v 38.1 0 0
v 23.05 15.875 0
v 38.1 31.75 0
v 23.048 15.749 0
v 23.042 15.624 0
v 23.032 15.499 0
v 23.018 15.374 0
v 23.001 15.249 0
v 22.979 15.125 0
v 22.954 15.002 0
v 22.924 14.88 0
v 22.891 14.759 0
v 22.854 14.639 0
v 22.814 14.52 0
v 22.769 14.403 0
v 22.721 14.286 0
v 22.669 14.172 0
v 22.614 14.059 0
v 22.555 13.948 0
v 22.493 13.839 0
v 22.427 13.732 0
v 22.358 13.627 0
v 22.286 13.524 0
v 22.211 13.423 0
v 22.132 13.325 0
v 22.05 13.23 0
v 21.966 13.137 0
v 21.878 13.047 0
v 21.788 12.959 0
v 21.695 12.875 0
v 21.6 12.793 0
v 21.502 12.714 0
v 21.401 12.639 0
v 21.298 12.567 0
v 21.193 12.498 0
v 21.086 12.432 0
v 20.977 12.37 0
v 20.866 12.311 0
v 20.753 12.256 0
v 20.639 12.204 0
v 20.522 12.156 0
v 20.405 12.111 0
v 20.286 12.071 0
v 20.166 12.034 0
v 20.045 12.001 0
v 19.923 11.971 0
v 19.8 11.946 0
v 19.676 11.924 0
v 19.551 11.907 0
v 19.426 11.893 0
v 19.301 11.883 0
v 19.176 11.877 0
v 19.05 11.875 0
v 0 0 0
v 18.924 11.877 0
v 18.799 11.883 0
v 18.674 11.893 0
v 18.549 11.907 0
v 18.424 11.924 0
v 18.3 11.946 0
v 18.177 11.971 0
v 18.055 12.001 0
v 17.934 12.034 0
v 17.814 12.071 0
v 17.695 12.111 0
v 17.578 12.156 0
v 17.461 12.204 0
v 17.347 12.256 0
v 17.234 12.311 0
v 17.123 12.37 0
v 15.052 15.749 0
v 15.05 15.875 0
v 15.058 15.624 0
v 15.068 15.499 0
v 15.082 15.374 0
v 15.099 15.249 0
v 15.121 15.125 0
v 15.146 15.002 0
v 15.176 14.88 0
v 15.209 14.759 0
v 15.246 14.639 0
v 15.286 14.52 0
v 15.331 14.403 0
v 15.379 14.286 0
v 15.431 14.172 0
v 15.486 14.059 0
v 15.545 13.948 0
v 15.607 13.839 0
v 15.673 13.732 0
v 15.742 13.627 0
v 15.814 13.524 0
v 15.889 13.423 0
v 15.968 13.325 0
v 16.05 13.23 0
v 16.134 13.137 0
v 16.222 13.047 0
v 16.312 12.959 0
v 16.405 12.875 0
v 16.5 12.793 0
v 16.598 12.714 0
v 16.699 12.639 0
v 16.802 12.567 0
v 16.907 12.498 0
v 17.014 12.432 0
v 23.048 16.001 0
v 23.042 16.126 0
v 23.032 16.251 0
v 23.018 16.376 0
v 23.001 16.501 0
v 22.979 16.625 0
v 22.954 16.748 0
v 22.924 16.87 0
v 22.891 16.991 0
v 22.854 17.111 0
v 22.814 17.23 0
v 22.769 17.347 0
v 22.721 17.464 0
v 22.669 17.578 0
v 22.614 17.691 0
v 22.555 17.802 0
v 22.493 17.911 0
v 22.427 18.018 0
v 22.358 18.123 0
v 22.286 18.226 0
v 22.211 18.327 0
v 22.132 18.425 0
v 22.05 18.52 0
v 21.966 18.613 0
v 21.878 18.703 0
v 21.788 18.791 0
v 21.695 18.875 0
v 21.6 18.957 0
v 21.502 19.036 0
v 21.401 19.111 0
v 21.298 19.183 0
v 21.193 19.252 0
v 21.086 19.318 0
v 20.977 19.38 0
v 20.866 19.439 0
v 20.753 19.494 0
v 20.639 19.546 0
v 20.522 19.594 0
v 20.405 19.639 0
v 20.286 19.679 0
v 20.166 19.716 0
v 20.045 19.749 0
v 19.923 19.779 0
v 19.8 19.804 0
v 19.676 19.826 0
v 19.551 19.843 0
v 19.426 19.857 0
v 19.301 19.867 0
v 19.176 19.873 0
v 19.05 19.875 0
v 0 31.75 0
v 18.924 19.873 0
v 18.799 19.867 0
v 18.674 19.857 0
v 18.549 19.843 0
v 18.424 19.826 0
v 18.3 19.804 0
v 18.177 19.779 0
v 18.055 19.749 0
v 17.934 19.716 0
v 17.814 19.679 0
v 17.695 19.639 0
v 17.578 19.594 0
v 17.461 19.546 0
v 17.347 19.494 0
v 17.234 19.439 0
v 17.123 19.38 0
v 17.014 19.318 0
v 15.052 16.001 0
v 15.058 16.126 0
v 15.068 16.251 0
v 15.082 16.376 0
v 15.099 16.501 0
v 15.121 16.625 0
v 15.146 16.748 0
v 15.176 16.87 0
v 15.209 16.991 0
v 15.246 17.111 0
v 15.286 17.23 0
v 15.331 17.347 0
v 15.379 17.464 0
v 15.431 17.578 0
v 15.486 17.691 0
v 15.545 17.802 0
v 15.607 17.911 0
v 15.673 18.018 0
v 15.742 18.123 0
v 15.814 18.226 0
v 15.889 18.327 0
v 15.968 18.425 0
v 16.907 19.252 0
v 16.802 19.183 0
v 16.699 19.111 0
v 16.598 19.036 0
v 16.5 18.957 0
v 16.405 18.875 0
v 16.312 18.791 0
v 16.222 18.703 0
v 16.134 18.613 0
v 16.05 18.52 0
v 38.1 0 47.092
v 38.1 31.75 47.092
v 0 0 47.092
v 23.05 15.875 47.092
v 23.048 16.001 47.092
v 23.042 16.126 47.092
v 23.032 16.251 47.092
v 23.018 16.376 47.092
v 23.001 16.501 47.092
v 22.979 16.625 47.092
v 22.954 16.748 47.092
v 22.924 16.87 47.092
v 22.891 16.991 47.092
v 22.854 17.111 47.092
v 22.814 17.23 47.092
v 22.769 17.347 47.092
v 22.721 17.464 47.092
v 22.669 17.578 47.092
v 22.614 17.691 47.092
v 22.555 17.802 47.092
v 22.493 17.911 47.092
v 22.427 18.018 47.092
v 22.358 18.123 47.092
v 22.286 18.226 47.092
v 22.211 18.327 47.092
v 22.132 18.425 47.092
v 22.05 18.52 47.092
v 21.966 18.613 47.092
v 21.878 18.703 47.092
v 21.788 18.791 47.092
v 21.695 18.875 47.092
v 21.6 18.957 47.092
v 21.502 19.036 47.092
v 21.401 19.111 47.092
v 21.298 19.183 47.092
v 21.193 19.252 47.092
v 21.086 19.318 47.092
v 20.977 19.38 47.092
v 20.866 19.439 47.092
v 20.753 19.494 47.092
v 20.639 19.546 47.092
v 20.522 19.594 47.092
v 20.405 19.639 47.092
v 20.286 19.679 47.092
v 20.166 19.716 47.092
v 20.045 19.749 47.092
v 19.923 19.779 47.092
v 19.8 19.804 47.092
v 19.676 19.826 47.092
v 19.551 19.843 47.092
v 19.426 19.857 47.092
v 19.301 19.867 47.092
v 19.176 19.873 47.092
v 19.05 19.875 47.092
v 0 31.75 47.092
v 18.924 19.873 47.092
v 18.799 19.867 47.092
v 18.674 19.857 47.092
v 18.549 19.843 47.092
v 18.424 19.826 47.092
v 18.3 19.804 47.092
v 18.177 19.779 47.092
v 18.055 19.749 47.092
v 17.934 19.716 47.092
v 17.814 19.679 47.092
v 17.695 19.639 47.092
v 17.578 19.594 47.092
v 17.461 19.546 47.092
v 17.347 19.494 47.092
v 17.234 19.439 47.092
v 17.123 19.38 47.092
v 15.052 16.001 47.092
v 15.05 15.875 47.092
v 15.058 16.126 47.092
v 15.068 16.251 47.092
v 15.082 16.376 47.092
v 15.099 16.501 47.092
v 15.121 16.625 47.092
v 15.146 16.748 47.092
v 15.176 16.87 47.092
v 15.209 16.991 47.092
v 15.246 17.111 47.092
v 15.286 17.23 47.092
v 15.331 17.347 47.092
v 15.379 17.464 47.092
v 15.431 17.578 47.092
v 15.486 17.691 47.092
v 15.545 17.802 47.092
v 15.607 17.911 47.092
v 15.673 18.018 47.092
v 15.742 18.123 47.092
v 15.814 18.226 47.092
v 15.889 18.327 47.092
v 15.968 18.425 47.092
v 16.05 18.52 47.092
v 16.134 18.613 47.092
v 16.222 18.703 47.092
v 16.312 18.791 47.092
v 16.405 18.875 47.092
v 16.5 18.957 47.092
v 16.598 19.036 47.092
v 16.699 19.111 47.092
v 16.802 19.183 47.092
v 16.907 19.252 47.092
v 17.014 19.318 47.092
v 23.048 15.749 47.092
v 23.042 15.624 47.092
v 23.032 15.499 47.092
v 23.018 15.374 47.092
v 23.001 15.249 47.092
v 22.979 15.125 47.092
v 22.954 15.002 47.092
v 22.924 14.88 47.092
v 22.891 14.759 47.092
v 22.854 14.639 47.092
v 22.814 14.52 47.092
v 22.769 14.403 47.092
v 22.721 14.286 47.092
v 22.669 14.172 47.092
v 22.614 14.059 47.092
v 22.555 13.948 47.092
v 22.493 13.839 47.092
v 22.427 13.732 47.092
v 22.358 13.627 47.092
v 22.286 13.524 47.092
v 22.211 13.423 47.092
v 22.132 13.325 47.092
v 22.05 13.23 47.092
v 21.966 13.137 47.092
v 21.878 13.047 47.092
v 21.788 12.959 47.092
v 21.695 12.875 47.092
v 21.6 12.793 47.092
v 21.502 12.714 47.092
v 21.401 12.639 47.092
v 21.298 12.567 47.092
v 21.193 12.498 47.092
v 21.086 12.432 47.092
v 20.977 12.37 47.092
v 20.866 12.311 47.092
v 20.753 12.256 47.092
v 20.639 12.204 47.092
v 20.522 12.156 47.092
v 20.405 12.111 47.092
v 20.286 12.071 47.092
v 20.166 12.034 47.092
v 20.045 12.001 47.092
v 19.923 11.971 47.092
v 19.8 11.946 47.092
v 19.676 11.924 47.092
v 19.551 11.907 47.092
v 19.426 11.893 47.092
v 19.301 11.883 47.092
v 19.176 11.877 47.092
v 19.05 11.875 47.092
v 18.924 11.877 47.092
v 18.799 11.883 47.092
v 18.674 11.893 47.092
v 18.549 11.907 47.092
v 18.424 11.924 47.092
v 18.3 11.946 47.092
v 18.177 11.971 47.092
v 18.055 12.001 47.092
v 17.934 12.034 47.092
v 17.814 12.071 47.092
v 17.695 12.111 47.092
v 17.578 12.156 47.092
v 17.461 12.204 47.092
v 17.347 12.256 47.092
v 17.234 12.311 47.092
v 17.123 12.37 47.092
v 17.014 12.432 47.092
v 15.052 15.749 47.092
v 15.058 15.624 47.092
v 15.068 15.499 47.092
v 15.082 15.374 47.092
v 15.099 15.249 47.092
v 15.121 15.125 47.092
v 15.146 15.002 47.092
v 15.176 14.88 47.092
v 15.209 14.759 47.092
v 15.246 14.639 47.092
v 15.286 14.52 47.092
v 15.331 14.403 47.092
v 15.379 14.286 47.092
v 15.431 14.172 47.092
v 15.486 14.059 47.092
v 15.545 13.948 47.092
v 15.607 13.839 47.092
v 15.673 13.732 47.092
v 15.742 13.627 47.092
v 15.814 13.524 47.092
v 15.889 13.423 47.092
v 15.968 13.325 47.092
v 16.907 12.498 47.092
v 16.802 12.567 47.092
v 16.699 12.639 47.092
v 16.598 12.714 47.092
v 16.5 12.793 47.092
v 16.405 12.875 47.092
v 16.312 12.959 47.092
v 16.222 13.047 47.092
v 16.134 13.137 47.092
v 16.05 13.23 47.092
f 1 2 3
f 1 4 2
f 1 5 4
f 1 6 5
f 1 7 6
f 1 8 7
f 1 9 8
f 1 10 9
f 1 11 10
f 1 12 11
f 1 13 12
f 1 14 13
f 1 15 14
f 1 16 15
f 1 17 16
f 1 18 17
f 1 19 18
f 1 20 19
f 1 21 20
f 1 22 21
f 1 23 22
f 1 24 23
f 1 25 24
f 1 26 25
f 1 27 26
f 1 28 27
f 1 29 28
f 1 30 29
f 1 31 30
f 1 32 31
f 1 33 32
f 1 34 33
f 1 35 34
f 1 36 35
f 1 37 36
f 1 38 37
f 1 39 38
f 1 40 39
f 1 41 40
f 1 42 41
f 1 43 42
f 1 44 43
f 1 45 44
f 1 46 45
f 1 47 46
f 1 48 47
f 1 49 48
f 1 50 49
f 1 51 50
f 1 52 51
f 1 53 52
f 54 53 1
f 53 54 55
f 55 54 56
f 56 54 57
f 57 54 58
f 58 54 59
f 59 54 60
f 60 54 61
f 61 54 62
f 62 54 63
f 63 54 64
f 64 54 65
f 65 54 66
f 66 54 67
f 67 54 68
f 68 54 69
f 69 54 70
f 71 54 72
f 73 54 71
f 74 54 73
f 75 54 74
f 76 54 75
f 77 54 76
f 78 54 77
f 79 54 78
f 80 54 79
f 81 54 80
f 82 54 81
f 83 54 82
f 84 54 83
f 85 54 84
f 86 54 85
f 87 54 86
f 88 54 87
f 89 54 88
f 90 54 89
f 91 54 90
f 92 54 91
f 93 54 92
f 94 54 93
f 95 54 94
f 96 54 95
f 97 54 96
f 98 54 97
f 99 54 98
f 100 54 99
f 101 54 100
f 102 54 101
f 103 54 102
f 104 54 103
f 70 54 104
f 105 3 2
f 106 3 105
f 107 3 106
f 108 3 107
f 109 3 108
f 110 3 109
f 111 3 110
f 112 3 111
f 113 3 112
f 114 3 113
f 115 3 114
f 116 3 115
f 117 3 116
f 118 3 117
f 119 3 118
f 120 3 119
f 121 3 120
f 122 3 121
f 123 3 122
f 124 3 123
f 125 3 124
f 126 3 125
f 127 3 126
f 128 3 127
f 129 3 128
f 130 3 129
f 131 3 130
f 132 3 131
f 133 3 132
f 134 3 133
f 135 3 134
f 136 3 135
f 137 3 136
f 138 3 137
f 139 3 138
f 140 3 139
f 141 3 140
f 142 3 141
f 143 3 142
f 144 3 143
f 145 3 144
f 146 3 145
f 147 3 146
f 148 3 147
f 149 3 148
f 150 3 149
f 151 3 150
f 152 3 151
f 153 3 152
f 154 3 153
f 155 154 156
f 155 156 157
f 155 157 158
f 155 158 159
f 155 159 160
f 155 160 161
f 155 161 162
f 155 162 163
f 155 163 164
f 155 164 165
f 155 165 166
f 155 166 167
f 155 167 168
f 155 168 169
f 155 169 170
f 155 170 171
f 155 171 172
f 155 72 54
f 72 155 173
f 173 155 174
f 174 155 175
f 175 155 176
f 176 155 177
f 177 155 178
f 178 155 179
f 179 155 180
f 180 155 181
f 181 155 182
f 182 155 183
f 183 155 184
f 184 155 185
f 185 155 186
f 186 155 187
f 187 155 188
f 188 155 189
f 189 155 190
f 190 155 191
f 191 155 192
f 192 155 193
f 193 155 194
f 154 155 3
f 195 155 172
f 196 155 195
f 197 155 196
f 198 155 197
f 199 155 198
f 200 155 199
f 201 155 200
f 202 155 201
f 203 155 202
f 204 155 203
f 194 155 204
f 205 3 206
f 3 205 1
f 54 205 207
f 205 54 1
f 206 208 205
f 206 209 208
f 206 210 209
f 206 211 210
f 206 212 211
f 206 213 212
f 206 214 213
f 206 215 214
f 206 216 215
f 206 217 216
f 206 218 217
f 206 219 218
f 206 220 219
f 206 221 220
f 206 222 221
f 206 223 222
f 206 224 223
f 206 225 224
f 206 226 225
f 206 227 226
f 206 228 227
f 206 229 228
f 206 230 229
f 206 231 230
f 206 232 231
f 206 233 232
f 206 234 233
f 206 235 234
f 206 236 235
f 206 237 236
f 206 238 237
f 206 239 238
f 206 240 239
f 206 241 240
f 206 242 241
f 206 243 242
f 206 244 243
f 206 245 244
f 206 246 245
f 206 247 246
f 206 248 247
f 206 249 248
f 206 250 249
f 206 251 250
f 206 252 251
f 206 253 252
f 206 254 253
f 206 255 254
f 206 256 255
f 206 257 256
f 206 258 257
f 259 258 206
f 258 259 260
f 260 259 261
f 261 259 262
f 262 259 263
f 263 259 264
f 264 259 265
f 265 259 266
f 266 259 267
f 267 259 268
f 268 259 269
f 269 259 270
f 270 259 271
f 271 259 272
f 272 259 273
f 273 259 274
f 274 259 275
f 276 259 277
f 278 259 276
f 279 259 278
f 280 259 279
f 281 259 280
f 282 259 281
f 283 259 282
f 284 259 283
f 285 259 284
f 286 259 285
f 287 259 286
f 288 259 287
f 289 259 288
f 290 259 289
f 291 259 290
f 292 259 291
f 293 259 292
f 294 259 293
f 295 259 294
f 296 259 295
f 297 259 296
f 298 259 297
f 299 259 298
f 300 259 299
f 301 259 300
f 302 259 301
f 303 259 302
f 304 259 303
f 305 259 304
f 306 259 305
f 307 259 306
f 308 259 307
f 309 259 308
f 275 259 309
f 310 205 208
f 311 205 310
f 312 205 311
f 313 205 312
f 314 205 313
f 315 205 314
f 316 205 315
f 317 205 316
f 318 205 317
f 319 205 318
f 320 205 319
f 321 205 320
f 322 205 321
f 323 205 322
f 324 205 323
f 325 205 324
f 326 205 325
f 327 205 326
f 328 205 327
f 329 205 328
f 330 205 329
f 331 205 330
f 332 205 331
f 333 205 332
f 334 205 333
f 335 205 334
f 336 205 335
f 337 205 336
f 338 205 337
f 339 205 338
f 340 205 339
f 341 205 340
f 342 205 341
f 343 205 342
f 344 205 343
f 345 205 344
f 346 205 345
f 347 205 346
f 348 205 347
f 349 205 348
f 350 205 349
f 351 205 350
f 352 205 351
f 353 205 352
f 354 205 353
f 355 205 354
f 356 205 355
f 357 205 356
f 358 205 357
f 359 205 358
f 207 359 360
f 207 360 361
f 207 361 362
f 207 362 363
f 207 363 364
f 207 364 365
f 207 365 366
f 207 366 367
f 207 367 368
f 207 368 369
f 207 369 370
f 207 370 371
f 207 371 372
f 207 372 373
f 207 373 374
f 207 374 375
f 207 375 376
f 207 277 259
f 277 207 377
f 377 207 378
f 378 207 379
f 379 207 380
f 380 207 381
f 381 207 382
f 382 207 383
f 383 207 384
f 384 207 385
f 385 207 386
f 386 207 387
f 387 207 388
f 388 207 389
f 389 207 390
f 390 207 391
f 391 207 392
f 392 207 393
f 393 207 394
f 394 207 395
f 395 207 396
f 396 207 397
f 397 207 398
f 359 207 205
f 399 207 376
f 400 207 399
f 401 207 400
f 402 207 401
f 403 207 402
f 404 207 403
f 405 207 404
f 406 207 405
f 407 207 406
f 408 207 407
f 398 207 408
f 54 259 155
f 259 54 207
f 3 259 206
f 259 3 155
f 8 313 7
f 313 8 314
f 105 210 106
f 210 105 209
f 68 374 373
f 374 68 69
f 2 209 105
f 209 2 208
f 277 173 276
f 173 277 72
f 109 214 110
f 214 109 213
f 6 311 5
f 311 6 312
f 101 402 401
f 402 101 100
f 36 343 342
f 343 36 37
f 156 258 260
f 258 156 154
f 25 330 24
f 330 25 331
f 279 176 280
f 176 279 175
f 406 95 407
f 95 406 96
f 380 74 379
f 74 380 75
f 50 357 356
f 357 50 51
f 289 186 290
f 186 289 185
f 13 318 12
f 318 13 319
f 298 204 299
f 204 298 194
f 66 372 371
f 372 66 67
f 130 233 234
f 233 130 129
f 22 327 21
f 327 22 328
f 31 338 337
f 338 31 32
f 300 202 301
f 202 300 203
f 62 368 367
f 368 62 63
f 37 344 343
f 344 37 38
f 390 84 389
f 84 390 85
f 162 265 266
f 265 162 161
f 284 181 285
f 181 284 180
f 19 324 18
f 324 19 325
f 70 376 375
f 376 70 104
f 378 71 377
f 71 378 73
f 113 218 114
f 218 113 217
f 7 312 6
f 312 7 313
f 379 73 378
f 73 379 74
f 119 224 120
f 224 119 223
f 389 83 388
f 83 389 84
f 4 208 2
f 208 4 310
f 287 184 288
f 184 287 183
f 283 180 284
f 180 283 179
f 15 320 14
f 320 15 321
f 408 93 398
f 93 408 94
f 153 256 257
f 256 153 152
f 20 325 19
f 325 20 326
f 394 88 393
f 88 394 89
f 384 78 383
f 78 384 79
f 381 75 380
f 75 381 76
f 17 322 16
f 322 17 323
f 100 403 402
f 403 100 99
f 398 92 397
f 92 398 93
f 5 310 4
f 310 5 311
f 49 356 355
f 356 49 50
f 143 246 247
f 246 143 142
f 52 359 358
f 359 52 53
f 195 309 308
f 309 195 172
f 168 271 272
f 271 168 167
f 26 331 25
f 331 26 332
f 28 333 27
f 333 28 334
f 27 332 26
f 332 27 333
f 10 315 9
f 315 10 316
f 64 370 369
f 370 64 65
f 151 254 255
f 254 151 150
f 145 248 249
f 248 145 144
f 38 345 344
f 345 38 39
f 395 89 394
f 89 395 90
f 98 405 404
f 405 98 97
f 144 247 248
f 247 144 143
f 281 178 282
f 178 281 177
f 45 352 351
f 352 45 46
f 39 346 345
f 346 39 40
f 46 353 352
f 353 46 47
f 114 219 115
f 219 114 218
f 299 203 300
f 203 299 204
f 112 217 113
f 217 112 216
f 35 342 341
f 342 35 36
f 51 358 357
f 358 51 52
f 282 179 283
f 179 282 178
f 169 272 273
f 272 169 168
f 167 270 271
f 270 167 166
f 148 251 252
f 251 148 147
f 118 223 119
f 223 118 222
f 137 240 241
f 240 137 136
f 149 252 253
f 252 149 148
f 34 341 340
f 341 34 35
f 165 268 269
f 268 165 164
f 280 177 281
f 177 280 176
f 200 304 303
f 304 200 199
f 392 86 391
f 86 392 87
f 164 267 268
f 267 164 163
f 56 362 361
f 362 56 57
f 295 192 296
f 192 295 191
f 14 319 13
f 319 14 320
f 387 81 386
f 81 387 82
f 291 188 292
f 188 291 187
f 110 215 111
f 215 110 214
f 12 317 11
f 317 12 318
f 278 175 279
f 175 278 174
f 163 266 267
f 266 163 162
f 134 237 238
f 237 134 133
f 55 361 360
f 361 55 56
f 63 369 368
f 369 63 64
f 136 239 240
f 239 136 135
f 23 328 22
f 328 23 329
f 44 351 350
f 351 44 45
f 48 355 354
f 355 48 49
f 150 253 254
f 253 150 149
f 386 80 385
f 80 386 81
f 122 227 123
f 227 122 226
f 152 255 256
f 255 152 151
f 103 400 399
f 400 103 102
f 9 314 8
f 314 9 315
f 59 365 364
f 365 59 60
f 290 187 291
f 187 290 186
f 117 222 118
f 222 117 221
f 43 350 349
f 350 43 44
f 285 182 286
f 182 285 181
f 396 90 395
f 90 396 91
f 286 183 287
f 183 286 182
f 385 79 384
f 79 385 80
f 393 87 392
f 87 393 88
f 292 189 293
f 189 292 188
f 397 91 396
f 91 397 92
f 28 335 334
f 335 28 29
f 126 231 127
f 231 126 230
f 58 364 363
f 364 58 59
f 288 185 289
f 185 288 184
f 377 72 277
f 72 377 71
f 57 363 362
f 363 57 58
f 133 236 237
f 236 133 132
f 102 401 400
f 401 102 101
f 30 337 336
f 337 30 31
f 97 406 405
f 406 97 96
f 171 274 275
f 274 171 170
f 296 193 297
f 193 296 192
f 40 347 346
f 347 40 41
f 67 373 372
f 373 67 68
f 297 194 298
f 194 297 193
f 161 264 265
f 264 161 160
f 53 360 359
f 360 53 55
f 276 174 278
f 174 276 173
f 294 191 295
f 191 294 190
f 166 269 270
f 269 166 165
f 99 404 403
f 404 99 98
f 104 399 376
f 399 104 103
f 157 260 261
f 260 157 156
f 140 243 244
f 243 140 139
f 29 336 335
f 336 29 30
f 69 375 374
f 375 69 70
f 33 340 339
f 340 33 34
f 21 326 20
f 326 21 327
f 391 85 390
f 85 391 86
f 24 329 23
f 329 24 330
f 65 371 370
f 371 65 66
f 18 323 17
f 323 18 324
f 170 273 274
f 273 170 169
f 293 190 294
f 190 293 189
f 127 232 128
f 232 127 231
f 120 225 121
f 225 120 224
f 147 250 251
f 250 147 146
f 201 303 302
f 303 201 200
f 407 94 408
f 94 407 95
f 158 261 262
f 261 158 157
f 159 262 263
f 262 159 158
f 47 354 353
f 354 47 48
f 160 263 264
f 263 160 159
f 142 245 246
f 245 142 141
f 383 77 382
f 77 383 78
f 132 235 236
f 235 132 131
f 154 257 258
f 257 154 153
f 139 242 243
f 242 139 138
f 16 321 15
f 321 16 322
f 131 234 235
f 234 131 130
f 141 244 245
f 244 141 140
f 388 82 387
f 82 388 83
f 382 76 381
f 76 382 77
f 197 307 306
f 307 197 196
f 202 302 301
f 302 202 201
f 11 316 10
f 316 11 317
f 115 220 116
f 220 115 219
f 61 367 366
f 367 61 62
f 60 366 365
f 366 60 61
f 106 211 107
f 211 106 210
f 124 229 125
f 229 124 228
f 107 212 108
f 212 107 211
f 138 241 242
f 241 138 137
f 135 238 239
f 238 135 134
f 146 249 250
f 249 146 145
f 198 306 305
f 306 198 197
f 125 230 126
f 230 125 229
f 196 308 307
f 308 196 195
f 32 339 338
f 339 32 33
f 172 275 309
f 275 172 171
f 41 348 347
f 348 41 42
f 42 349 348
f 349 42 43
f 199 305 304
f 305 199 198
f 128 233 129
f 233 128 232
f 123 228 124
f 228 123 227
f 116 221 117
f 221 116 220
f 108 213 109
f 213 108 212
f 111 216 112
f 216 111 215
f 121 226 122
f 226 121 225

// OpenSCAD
width = 25.4 * 1.5;
depth = 25.4 * 1.25;
height = 1.854 * 25.4;
bolt = 8;

#difference()
{
linear_extrude(height = height )
{
	polygon(points=[[0, 0],[width, 0],[width, depth], [0, depth]]);

}

linear_extrude(height = height)
{
	translate([width/2, depth/2,0])
	{
		circle($fn = 200, r = bolt/2);
	}
}
}
